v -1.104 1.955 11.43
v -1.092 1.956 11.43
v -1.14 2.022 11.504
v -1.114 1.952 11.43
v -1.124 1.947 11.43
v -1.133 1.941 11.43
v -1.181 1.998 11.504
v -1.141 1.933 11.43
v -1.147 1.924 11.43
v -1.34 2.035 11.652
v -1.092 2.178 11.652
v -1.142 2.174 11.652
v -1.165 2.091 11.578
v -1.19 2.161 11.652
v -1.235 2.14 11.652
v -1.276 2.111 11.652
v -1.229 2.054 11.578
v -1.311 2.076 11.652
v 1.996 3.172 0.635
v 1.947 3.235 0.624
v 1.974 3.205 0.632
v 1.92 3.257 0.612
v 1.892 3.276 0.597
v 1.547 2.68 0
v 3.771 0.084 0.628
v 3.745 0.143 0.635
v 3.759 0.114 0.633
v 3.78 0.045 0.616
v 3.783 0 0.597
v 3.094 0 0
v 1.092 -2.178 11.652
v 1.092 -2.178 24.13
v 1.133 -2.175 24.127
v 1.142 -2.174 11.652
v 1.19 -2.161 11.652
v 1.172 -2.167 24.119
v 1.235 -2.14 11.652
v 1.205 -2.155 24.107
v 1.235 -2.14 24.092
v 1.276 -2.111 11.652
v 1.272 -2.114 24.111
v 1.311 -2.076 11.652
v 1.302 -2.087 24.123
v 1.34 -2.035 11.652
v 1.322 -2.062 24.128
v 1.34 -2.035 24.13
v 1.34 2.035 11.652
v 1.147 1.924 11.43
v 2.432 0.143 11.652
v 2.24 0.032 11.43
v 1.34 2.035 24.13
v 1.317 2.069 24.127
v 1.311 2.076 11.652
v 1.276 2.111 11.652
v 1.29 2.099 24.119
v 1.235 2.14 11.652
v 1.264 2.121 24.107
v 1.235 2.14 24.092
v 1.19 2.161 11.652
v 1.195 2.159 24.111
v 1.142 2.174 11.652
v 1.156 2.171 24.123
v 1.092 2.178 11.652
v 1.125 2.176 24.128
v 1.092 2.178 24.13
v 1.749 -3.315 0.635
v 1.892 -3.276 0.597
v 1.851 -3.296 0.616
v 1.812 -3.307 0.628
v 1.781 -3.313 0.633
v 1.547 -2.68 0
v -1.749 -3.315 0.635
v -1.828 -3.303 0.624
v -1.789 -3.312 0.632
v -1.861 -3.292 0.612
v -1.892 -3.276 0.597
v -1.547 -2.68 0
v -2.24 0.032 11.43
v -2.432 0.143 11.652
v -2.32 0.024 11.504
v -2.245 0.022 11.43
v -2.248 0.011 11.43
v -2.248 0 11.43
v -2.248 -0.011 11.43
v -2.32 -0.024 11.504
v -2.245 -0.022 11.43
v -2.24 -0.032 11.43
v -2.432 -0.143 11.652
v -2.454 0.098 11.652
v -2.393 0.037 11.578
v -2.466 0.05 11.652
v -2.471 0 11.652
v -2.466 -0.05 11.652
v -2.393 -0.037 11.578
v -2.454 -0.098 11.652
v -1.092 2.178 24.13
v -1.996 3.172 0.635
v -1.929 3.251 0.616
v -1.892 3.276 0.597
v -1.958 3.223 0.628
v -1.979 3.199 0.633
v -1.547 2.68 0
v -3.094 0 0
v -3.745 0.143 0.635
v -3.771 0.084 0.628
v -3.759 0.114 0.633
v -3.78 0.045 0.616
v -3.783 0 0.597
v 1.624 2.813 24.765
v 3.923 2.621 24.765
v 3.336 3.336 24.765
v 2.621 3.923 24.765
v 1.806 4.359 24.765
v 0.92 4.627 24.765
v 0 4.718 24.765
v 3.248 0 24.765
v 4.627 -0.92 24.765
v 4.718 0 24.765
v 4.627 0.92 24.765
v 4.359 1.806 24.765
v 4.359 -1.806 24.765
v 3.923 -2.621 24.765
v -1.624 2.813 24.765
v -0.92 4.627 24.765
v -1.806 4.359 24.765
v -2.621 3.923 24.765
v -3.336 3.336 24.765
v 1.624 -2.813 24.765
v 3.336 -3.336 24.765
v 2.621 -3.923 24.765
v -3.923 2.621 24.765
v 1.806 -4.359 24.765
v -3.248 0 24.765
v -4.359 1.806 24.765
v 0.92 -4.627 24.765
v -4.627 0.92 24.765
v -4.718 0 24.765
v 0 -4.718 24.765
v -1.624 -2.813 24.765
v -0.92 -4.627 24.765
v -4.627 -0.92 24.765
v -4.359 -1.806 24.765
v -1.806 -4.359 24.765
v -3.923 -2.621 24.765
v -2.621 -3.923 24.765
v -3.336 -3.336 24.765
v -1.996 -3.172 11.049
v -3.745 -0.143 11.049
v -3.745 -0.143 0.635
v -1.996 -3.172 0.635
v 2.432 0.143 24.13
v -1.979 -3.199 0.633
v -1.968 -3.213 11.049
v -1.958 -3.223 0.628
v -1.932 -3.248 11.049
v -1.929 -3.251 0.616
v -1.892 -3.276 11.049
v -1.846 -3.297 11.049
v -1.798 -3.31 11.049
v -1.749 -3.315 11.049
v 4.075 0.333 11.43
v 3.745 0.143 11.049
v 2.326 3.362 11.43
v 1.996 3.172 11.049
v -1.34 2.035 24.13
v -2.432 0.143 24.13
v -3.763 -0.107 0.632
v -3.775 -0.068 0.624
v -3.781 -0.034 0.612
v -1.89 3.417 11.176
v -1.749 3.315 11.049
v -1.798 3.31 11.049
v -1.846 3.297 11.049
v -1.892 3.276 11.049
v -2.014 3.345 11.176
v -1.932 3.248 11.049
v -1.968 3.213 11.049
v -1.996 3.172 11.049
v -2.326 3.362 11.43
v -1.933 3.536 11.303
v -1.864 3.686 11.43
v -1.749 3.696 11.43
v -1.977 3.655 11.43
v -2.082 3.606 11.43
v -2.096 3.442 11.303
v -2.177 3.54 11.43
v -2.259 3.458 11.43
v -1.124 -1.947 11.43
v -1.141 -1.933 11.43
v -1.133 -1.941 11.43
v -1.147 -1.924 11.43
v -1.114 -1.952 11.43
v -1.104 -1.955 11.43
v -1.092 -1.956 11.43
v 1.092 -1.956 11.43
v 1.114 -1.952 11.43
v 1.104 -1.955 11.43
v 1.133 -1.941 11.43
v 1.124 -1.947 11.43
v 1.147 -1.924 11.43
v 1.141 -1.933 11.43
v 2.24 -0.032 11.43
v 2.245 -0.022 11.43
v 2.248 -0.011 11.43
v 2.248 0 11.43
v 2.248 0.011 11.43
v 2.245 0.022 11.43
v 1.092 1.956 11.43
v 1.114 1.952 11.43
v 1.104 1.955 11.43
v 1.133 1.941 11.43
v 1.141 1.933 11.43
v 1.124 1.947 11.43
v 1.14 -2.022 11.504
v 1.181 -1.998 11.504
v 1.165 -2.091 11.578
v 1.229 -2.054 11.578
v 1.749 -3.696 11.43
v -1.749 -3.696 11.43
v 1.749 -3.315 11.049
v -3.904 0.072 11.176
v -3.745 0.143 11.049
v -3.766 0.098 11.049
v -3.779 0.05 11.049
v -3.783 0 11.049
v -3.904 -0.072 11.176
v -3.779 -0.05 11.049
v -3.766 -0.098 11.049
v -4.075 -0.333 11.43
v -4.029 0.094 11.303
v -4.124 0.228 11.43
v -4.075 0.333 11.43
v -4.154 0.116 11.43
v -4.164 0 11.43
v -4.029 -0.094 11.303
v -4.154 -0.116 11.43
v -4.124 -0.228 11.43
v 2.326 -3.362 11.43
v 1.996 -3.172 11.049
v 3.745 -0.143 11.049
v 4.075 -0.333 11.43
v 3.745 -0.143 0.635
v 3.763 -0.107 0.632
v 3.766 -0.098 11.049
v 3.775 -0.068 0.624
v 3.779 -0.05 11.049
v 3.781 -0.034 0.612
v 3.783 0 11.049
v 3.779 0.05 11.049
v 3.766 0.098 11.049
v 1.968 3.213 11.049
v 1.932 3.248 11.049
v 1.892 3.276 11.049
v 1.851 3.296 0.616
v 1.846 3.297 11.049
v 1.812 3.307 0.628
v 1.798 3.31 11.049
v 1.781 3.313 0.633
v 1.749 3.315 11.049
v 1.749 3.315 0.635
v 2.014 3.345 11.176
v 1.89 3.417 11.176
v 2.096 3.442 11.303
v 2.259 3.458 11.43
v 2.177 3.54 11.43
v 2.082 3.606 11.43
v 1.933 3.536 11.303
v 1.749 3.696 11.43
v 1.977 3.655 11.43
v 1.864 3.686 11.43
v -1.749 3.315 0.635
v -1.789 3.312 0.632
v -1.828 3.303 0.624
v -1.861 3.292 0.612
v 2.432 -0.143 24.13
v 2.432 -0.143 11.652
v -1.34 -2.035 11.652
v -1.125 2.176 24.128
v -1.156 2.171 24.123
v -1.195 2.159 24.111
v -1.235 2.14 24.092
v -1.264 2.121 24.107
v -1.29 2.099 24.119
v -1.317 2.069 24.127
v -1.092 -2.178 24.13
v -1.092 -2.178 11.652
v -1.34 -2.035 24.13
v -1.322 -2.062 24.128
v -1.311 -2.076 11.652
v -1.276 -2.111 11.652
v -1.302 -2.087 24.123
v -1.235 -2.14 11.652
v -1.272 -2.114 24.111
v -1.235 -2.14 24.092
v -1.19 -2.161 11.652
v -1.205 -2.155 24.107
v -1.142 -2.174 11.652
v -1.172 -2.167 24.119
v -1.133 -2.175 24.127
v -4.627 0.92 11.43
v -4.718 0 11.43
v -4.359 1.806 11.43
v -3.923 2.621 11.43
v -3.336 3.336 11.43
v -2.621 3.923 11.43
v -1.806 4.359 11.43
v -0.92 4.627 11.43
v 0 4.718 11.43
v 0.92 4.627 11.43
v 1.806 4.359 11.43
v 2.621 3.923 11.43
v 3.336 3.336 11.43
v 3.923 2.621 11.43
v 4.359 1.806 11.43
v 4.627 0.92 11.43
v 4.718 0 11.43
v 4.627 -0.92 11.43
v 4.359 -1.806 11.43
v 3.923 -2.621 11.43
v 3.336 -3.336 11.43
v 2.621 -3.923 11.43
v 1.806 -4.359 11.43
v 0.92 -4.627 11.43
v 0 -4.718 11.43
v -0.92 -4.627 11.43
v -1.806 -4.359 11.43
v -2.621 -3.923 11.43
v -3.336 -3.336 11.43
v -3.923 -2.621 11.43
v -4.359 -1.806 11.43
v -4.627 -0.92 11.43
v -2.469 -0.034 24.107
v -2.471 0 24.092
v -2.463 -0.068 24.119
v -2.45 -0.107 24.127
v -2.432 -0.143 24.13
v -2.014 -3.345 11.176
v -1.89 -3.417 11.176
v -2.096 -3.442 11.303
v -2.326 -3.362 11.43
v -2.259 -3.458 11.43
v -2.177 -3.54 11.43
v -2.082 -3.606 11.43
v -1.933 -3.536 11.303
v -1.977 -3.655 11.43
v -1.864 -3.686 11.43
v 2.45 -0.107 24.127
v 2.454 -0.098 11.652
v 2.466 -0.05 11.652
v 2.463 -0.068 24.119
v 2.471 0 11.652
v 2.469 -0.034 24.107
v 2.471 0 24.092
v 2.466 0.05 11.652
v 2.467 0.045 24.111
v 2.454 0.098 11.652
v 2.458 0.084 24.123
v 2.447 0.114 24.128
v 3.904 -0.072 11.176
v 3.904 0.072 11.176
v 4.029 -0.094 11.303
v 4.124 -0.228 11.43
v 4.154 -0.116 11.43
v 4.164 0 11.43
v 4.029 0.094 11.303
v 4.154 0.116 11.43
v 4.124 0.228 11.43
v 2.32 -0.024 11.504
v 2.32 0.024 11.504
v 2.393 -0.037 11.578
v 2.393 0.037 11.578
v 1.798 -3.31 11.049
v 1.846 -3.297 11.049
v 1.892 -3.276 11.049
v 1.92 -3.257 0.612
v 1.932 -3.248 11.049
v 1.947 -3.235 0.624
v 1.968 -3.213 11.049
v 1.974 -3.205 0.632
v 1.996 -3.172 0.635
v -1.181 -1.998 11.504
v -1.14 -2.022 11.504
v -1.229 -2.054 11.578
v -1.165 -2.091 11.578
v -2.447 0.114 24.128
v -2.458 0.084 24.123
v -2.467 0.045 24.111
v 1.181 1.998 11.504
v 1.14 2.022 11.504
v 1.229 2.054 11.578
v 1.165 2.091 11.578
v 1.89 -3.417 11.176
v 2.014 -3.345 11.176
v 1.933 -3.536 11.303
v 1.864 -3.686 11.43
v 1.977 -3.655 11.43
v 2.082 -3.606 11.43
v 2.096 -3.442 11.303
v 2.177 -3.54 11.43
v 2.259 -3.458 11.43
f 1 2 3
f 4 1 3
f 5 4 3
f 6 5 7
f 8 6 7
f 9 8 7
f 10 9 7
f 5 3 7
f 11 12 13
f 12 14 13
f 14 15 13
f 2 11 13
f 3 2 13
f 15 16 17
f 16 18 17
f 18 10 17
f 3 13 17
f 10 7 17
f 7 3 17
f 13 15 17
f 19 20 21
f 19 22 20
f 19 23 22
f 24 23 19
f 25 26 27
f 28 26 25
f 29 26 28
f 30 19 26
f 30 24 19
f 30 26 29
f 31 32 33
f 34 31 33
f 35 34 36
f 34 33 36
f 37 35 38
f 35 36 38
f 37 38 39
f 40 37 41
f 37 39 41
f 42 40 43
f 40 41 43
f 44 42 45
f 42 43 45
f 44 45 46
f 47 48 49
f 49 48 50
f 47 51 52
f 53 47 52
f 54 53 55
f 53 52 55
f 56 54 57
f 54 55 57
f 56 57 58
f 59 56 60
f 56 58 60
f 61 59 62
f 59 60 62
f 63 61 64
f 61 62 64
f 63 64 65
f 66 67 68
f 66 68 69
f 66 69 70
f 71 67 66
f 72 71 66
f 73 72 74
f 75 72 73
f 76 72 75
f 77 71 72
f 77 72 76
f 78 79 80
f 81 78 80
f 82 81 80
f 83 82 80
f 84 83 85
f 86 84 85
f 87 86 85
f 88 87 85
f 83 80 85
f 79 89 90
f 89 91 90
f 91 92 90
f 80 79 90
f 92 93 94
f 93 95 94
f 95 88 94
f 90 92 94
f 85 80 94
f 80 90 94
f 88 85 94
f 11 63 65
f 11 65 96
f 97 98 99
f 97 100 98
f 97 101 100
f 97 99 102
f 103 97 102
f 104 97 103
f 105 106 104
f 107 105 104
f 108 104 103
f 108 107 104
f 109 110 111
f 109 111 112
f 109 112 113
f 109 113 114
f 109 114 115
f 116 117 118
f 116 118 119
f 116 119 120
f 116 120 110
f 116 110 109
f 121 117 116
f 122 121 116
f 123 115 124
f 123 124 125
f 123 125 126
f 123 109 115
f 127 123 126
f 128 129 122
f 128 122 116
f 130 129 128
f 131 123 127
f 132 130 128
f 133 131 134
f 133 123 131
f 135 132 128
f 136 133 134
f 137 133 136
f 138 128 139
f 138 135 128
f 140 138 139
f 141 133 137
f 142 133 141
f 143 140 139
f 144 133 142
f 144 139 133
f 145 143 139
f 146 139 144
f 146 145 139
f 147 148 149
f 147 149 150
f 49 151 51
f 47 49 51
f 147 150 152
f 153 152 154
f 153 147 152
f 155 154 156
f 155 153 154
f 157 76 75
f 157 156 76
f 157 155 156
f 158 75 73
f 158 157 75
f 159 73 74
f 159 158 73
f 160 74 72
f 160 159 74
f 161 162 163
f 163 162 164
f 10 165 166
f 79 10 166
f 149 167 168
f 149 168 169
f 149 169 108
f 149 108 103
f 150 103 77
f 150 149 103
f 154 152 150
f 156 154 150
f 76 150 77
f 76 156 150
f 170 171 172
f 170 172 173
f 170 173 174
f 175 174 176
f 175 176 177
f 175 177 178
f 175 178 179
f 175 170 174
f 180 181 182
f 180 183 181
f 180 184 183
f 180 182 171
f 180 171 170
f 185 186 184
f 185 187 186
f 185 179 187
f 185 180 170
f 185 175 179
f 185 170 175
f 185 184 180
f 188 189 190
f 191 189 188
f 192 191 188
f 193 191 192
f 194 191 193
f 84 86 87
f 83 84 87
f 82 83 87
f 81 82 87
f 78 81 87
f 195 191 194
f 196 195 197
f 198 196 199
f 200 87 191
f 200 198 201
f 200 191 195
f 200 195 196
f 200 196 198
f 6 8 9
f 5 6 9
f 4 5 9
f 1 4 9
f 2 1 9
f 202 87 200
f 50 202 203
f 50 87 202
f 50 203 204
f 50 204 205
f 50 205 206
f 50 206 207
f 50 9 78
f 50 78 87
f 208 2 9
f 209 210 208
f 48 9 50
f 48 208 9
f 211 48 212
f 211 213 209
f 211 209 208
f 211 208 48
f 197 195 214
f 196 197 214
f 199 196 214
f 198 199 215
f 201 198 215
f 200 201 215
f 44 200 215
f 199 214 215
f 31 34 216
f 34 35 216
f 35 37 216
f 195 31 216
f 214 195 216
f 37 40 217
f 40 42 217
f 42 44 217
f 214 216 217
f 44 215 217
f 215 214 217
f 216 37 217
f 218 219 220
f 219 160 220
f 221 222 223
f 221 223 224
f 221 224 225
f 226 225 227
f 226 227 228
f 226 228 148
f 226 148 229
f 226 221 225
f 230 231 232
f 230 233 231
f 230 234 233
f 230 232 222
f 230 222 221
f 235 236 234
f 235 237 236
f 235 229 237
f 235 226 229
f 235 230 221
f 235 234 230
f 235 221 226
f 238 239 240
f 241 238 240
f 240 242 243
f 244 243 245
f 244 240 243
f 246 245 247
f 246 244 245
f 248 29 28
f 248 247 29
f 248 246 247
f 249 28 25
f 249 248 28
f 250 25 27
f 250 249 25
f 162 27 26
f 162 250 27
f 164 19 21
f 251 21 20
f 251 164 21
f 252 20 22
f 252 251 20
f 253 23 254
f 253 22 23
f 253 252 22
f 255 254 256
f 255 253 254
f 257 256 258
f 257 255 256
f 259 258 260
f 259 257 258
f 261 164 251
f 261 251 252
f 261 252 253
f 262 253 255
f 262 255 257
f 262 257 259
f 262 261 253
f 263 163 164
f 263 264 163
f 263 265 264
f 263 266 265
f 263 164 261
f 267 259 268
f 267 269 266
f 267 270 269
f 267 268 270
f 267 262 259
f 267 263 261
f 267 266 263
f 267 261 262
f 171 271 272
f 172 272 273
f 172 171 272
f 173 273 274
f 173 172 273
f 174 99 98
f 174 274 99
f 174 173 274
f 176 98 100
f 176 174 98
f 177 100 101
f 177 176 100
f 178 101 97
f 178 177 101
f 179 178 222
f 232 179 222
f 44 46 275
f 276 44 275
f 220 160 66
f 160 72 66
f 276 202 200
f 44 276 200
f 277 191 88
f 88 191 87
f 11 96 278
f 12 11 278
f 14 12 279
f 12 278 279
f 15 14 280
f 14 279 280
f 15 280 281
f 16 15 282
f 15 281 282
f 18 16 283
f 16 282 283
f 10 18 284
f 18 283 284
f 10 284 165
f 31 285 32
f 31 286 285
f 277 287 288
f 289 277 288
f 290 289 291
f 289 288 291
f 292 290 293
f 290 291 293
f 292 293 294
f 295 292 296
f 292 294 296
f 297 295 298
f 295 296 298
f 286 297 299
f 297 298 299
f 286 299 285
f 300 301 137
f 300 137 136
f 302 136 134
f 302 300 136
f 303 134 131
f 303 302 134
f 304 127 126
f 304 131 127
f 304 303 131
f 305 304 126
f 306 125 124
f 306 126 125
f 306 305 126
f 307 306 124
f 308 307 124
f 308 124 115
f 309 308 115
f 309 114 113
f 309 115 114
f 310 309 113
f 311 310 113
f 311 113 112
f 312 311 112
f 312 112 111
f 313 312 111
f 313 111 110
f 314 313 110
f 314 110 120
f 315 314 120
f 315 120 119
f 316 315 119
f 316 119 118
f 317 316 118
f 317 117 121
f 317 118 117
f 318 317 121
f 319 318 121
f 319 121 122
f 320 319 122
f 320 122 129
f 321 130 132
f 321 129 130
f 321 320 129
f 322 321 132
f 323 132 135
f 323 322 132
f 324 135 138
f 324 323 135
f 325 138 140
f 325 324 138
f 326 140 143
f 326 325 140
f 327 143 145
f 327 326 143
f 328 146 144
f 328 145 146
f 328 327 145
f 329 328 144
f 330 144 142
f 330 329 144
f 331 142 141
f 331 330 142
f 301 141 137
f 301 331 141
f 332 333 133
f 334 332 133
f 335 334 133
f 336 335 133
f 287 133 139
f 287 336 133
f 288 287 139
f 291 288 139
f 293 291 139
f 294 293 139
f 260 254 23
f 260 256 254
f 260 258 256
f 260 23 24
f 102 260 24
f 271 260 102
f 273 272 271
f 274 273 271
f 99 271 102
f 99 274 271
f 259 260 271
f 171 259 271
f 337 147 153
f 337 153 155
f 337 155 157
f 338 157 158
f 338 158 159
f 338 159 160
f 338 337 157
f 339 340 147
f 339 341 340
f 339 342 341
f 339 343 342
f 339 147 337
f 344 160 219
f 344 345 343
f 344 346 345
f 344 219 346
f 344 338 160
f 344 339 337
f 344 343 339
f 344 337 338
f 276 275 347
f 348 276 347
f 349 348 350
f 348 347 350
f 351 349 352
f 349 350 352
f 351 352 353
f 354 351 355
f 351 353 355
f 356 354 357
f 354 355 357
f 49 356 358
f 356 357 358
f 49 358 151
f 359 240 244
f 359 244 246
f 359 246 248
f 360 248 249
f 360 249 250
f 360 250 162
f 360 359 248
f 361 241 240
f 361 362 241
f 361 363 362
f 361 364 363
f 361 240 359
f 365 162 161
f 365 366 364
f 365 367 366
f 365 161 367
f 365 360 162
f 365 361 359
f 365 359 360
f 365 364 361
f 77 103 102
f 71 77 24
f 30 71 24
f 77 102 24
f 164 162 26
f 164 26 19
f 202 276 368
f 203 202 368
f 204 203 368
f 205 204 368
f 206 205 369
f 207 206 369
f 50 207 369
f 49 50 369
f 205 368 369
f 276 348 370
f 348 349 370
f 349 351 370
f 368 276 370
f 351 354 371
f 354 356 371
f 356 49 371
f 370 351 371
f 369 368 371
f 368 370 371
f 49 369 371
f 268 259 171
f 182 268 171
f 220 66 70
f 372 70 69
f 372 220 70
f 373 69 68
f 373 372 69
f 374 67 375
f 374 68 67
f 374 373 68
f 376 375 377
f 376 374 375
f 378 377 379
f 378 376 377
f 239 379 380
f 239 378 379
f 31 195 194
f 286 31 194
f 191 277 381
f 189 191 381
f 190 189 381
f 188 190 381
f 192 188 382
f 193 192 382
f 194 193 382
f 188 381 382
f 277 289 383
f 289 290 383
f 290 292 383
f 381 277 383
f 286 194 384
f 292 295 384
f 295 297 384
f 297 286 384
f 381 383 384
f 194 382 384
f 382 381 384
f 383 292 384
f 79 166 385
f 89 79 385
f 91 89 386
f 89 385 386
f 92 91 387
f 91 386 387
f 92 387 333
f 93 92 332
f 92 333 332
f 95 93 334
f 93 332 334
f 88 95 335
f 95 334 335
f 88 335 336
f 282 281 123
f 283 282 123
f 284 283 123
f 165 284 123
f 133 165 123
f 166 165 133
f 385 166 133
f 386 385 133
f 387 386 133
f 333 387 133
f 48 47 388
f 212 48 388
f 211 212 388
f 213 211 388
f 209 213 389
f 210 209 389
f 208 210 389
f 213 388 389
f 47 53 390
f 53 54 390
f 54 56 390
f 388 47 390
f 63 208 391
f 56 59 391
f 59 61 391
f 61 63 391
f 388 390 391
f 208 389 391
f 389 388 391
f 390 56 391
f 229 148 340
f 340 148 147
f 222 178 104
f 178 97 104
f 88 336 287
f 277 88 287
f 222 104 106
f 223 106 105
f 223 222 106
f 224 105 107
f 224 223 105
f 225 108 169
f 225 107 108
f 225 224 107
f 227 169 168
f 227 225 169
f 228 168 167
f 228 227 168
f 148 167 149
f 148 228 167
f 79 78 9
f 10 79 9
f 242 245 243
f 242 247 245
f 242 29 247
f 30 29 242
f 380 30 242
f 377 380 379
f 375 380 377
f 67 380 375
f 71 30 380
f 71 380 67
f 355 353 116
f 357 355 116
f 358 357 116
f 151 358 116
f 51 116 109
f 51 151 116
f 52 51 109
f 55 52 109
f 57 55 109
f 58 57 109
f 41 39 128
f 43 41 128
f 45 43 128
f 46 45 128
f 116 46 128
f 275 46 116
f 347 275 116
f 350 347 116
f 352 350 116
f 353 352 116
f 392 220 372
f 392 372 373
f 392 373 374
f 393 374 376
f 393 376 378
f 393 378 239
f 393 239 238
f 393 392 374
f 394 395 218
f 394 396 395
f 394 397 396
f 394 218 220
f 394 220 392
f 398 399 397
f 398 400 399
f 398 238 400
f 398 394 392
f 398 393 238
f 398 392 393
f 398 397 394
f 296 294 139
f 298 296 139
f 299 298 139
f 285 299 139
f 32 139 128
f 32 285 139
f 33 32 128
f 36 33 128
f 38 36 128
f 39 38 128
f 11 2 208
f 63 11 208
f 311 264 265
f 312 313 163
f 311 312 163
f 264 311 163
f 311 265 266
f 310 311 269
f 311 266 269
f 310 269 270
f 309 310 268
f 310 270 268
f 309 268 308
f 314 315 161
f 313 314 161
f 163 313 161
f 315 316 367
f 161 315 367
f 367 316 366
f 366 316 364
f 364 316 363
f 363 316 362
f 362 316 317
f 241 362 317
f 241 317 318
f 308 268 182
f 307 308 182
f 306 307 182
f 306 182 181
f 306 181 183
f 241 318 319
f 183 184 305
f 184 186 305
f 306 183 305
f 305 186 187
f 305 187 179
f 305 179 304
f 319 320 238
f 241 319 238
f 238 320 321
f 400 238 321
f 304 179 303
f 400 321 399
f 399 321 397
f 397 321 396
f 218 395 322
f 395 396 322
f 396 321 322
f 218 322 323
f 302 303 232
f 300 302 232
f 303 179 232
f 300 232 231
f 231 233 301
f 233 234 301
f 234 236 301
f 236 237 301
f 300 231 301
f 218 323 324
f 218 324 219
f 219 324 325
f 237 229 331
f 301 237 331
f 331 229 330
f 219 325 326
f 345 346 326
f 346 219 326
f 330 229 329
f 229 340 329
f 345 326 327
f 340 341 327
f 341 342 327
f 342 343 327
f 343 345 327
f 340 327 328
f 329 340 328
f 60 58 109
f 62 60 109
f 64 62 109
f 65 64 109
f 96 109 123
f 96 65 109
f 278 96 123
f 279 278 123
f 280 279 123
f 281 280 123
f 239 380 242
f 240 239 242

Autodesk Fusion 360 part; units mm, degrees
sketch "Sketch1" plane through (0, 0, 0) normal (0, 0, 1) x (1, 0, 0)
  line L0 (3.8275, 0) -> (1.9137, 3.3147)
  line L1 (1.9137, 3.3147) -> (-1.9137, 3.3147)
  line L2 (-1.9137, 3.3147) -> (-3.8275, 0)
  line L3 (-3.8275, 0) -> (-1.9137, -3.3147)
  line L4 (-1.9137, -3.3147) -> (1.9137, -3.3147)
  line L5 (1.9137, -3.3147) -> (3.8275, 0)
  line L6 (0, 0) -> (0, -3.3147) construction
  dimension "d1" = 6.6294
extrude "Extrude1" add sketch "Sketch1" along normal blind 11.43
sketch "Sketch2" plane through (0, 0, 11.43) normal (0, 0, 1) x (-1, 0, 0)
  line L0 (-1.9137, 3.3147) -> (-3.8275, 0)
  line L1 (-3.8275, 0) -> (-1.9137, -3.3147)
  line L2 (-1.9137, -3.3147) -> (1.9137, -3.3147)
  line L3 (1.9137, -3.3147) -> (3.8275, 0)
  line L4 (3.8275, 0) -> (1.9137, 3.3147)
  line L5 (1.9137, 3.3147) -> (-1.9137, 3.3147)
  line L6 (-2.515, 0) -> (-1.2575, -2.1781)
  line L7 (-1.2575, -2.1781) -> (1.2575, -2.1781)
  line L8 (1.2575, -2.1781) -> (2.515, 0)
  line L9 (2.515, 0) -> (1.2575, 2.1781)
  line L10 (1.2575, 2.1781) -> (-1.2575, 2.1781)
  line L11 (-1.2575, 2.1781) -> (-2.515, 0)
  line L12 (0, 2.1781) -> (0, 0) construction
  line L13 (-2.724, 4.7181) -> (-5.4479, 0) construction
  line L14 (-5.4479, 0) -> (-2.724, -4.718) construction
  line L15 (-2.724, -4.718) -> (2.724, -4.718) construction
  line L16 (2.724, -4.718) -> (5.4479, 0) construction
  line L17 (5.4479, 0) -> (2.724, 4.7181) construction
  line L18 (2.724, 4.7181) -> (-2.724, 4.7181) construction
  circle A0 centre (0, 0) radius 4.7181
  dimension "d5" = 4.3561
  dimension "d6" = 2.54
extrude "Extrude2" add sketch "Sketch2" along normal blind 13.335 contours L0 L1 L2 L3 L4 L5 | A0
chamfer "Chamfer1" distance 0.635 angle 45 6 edges at (0, -2.1781, 24.765) (-1.8862, -1.089, 24.765) (-1.8862, 1.089, 24.765) (0, 2.1781, 24.765) (1.8862, 1.089, 24.765) (1.8862, -1.089, 24.765) 1 faces at (1.2758, 0, 0)
fillet "Fillet1" radius 0.2858 12 edges at (-3.8275, 0, 6.0325) (-1.9137, -3.3147, 6.0325) (1.9137, -3.3147, 6.0325) (-1.9137, 3.3147, 6.0325) (1.9137, 3.3147, 6.0325) (3.8275, 0, 6.0325) (2.515, 0, 17.78) (1.2575, -2.1781, 17.78) (-1.2575, -2.1781, 17.78) (-2.515, 0, 17.78) (-1.2575, 2.1781, 17.78) (1.2575, 2.1781, 17.78)
chamfer "Chamfer2" distance 0.381 angle 45 12 edges at (2.8706, 1.6574, 11.43) (1.8916, 3.2764, 11.43) (0, 3.3147, 11.43) (-1.8916, 3.2764, 11.43) (-2.8706, 1.6574, 11.43) (-3.7833, 0, 11.43) (-2.8706, -1.6574, 11.43) (-1.8916, -3.2764, 11.43) (0, -3.3147, 11.43) (1.8916, -3.2764, 11.43) (2.8706, -1.6574, 11.43) (3.7833, 0, 11.43)
chamfer "Chamfer3" distance 0.2223 angle 45 1 faces at (0.3642, 0.726, 11.43)
equation "d1 = 0.248 in + 0.013 in"
equation "d5 = 0.1565 in + ( 0.015 ) * 1 in"
